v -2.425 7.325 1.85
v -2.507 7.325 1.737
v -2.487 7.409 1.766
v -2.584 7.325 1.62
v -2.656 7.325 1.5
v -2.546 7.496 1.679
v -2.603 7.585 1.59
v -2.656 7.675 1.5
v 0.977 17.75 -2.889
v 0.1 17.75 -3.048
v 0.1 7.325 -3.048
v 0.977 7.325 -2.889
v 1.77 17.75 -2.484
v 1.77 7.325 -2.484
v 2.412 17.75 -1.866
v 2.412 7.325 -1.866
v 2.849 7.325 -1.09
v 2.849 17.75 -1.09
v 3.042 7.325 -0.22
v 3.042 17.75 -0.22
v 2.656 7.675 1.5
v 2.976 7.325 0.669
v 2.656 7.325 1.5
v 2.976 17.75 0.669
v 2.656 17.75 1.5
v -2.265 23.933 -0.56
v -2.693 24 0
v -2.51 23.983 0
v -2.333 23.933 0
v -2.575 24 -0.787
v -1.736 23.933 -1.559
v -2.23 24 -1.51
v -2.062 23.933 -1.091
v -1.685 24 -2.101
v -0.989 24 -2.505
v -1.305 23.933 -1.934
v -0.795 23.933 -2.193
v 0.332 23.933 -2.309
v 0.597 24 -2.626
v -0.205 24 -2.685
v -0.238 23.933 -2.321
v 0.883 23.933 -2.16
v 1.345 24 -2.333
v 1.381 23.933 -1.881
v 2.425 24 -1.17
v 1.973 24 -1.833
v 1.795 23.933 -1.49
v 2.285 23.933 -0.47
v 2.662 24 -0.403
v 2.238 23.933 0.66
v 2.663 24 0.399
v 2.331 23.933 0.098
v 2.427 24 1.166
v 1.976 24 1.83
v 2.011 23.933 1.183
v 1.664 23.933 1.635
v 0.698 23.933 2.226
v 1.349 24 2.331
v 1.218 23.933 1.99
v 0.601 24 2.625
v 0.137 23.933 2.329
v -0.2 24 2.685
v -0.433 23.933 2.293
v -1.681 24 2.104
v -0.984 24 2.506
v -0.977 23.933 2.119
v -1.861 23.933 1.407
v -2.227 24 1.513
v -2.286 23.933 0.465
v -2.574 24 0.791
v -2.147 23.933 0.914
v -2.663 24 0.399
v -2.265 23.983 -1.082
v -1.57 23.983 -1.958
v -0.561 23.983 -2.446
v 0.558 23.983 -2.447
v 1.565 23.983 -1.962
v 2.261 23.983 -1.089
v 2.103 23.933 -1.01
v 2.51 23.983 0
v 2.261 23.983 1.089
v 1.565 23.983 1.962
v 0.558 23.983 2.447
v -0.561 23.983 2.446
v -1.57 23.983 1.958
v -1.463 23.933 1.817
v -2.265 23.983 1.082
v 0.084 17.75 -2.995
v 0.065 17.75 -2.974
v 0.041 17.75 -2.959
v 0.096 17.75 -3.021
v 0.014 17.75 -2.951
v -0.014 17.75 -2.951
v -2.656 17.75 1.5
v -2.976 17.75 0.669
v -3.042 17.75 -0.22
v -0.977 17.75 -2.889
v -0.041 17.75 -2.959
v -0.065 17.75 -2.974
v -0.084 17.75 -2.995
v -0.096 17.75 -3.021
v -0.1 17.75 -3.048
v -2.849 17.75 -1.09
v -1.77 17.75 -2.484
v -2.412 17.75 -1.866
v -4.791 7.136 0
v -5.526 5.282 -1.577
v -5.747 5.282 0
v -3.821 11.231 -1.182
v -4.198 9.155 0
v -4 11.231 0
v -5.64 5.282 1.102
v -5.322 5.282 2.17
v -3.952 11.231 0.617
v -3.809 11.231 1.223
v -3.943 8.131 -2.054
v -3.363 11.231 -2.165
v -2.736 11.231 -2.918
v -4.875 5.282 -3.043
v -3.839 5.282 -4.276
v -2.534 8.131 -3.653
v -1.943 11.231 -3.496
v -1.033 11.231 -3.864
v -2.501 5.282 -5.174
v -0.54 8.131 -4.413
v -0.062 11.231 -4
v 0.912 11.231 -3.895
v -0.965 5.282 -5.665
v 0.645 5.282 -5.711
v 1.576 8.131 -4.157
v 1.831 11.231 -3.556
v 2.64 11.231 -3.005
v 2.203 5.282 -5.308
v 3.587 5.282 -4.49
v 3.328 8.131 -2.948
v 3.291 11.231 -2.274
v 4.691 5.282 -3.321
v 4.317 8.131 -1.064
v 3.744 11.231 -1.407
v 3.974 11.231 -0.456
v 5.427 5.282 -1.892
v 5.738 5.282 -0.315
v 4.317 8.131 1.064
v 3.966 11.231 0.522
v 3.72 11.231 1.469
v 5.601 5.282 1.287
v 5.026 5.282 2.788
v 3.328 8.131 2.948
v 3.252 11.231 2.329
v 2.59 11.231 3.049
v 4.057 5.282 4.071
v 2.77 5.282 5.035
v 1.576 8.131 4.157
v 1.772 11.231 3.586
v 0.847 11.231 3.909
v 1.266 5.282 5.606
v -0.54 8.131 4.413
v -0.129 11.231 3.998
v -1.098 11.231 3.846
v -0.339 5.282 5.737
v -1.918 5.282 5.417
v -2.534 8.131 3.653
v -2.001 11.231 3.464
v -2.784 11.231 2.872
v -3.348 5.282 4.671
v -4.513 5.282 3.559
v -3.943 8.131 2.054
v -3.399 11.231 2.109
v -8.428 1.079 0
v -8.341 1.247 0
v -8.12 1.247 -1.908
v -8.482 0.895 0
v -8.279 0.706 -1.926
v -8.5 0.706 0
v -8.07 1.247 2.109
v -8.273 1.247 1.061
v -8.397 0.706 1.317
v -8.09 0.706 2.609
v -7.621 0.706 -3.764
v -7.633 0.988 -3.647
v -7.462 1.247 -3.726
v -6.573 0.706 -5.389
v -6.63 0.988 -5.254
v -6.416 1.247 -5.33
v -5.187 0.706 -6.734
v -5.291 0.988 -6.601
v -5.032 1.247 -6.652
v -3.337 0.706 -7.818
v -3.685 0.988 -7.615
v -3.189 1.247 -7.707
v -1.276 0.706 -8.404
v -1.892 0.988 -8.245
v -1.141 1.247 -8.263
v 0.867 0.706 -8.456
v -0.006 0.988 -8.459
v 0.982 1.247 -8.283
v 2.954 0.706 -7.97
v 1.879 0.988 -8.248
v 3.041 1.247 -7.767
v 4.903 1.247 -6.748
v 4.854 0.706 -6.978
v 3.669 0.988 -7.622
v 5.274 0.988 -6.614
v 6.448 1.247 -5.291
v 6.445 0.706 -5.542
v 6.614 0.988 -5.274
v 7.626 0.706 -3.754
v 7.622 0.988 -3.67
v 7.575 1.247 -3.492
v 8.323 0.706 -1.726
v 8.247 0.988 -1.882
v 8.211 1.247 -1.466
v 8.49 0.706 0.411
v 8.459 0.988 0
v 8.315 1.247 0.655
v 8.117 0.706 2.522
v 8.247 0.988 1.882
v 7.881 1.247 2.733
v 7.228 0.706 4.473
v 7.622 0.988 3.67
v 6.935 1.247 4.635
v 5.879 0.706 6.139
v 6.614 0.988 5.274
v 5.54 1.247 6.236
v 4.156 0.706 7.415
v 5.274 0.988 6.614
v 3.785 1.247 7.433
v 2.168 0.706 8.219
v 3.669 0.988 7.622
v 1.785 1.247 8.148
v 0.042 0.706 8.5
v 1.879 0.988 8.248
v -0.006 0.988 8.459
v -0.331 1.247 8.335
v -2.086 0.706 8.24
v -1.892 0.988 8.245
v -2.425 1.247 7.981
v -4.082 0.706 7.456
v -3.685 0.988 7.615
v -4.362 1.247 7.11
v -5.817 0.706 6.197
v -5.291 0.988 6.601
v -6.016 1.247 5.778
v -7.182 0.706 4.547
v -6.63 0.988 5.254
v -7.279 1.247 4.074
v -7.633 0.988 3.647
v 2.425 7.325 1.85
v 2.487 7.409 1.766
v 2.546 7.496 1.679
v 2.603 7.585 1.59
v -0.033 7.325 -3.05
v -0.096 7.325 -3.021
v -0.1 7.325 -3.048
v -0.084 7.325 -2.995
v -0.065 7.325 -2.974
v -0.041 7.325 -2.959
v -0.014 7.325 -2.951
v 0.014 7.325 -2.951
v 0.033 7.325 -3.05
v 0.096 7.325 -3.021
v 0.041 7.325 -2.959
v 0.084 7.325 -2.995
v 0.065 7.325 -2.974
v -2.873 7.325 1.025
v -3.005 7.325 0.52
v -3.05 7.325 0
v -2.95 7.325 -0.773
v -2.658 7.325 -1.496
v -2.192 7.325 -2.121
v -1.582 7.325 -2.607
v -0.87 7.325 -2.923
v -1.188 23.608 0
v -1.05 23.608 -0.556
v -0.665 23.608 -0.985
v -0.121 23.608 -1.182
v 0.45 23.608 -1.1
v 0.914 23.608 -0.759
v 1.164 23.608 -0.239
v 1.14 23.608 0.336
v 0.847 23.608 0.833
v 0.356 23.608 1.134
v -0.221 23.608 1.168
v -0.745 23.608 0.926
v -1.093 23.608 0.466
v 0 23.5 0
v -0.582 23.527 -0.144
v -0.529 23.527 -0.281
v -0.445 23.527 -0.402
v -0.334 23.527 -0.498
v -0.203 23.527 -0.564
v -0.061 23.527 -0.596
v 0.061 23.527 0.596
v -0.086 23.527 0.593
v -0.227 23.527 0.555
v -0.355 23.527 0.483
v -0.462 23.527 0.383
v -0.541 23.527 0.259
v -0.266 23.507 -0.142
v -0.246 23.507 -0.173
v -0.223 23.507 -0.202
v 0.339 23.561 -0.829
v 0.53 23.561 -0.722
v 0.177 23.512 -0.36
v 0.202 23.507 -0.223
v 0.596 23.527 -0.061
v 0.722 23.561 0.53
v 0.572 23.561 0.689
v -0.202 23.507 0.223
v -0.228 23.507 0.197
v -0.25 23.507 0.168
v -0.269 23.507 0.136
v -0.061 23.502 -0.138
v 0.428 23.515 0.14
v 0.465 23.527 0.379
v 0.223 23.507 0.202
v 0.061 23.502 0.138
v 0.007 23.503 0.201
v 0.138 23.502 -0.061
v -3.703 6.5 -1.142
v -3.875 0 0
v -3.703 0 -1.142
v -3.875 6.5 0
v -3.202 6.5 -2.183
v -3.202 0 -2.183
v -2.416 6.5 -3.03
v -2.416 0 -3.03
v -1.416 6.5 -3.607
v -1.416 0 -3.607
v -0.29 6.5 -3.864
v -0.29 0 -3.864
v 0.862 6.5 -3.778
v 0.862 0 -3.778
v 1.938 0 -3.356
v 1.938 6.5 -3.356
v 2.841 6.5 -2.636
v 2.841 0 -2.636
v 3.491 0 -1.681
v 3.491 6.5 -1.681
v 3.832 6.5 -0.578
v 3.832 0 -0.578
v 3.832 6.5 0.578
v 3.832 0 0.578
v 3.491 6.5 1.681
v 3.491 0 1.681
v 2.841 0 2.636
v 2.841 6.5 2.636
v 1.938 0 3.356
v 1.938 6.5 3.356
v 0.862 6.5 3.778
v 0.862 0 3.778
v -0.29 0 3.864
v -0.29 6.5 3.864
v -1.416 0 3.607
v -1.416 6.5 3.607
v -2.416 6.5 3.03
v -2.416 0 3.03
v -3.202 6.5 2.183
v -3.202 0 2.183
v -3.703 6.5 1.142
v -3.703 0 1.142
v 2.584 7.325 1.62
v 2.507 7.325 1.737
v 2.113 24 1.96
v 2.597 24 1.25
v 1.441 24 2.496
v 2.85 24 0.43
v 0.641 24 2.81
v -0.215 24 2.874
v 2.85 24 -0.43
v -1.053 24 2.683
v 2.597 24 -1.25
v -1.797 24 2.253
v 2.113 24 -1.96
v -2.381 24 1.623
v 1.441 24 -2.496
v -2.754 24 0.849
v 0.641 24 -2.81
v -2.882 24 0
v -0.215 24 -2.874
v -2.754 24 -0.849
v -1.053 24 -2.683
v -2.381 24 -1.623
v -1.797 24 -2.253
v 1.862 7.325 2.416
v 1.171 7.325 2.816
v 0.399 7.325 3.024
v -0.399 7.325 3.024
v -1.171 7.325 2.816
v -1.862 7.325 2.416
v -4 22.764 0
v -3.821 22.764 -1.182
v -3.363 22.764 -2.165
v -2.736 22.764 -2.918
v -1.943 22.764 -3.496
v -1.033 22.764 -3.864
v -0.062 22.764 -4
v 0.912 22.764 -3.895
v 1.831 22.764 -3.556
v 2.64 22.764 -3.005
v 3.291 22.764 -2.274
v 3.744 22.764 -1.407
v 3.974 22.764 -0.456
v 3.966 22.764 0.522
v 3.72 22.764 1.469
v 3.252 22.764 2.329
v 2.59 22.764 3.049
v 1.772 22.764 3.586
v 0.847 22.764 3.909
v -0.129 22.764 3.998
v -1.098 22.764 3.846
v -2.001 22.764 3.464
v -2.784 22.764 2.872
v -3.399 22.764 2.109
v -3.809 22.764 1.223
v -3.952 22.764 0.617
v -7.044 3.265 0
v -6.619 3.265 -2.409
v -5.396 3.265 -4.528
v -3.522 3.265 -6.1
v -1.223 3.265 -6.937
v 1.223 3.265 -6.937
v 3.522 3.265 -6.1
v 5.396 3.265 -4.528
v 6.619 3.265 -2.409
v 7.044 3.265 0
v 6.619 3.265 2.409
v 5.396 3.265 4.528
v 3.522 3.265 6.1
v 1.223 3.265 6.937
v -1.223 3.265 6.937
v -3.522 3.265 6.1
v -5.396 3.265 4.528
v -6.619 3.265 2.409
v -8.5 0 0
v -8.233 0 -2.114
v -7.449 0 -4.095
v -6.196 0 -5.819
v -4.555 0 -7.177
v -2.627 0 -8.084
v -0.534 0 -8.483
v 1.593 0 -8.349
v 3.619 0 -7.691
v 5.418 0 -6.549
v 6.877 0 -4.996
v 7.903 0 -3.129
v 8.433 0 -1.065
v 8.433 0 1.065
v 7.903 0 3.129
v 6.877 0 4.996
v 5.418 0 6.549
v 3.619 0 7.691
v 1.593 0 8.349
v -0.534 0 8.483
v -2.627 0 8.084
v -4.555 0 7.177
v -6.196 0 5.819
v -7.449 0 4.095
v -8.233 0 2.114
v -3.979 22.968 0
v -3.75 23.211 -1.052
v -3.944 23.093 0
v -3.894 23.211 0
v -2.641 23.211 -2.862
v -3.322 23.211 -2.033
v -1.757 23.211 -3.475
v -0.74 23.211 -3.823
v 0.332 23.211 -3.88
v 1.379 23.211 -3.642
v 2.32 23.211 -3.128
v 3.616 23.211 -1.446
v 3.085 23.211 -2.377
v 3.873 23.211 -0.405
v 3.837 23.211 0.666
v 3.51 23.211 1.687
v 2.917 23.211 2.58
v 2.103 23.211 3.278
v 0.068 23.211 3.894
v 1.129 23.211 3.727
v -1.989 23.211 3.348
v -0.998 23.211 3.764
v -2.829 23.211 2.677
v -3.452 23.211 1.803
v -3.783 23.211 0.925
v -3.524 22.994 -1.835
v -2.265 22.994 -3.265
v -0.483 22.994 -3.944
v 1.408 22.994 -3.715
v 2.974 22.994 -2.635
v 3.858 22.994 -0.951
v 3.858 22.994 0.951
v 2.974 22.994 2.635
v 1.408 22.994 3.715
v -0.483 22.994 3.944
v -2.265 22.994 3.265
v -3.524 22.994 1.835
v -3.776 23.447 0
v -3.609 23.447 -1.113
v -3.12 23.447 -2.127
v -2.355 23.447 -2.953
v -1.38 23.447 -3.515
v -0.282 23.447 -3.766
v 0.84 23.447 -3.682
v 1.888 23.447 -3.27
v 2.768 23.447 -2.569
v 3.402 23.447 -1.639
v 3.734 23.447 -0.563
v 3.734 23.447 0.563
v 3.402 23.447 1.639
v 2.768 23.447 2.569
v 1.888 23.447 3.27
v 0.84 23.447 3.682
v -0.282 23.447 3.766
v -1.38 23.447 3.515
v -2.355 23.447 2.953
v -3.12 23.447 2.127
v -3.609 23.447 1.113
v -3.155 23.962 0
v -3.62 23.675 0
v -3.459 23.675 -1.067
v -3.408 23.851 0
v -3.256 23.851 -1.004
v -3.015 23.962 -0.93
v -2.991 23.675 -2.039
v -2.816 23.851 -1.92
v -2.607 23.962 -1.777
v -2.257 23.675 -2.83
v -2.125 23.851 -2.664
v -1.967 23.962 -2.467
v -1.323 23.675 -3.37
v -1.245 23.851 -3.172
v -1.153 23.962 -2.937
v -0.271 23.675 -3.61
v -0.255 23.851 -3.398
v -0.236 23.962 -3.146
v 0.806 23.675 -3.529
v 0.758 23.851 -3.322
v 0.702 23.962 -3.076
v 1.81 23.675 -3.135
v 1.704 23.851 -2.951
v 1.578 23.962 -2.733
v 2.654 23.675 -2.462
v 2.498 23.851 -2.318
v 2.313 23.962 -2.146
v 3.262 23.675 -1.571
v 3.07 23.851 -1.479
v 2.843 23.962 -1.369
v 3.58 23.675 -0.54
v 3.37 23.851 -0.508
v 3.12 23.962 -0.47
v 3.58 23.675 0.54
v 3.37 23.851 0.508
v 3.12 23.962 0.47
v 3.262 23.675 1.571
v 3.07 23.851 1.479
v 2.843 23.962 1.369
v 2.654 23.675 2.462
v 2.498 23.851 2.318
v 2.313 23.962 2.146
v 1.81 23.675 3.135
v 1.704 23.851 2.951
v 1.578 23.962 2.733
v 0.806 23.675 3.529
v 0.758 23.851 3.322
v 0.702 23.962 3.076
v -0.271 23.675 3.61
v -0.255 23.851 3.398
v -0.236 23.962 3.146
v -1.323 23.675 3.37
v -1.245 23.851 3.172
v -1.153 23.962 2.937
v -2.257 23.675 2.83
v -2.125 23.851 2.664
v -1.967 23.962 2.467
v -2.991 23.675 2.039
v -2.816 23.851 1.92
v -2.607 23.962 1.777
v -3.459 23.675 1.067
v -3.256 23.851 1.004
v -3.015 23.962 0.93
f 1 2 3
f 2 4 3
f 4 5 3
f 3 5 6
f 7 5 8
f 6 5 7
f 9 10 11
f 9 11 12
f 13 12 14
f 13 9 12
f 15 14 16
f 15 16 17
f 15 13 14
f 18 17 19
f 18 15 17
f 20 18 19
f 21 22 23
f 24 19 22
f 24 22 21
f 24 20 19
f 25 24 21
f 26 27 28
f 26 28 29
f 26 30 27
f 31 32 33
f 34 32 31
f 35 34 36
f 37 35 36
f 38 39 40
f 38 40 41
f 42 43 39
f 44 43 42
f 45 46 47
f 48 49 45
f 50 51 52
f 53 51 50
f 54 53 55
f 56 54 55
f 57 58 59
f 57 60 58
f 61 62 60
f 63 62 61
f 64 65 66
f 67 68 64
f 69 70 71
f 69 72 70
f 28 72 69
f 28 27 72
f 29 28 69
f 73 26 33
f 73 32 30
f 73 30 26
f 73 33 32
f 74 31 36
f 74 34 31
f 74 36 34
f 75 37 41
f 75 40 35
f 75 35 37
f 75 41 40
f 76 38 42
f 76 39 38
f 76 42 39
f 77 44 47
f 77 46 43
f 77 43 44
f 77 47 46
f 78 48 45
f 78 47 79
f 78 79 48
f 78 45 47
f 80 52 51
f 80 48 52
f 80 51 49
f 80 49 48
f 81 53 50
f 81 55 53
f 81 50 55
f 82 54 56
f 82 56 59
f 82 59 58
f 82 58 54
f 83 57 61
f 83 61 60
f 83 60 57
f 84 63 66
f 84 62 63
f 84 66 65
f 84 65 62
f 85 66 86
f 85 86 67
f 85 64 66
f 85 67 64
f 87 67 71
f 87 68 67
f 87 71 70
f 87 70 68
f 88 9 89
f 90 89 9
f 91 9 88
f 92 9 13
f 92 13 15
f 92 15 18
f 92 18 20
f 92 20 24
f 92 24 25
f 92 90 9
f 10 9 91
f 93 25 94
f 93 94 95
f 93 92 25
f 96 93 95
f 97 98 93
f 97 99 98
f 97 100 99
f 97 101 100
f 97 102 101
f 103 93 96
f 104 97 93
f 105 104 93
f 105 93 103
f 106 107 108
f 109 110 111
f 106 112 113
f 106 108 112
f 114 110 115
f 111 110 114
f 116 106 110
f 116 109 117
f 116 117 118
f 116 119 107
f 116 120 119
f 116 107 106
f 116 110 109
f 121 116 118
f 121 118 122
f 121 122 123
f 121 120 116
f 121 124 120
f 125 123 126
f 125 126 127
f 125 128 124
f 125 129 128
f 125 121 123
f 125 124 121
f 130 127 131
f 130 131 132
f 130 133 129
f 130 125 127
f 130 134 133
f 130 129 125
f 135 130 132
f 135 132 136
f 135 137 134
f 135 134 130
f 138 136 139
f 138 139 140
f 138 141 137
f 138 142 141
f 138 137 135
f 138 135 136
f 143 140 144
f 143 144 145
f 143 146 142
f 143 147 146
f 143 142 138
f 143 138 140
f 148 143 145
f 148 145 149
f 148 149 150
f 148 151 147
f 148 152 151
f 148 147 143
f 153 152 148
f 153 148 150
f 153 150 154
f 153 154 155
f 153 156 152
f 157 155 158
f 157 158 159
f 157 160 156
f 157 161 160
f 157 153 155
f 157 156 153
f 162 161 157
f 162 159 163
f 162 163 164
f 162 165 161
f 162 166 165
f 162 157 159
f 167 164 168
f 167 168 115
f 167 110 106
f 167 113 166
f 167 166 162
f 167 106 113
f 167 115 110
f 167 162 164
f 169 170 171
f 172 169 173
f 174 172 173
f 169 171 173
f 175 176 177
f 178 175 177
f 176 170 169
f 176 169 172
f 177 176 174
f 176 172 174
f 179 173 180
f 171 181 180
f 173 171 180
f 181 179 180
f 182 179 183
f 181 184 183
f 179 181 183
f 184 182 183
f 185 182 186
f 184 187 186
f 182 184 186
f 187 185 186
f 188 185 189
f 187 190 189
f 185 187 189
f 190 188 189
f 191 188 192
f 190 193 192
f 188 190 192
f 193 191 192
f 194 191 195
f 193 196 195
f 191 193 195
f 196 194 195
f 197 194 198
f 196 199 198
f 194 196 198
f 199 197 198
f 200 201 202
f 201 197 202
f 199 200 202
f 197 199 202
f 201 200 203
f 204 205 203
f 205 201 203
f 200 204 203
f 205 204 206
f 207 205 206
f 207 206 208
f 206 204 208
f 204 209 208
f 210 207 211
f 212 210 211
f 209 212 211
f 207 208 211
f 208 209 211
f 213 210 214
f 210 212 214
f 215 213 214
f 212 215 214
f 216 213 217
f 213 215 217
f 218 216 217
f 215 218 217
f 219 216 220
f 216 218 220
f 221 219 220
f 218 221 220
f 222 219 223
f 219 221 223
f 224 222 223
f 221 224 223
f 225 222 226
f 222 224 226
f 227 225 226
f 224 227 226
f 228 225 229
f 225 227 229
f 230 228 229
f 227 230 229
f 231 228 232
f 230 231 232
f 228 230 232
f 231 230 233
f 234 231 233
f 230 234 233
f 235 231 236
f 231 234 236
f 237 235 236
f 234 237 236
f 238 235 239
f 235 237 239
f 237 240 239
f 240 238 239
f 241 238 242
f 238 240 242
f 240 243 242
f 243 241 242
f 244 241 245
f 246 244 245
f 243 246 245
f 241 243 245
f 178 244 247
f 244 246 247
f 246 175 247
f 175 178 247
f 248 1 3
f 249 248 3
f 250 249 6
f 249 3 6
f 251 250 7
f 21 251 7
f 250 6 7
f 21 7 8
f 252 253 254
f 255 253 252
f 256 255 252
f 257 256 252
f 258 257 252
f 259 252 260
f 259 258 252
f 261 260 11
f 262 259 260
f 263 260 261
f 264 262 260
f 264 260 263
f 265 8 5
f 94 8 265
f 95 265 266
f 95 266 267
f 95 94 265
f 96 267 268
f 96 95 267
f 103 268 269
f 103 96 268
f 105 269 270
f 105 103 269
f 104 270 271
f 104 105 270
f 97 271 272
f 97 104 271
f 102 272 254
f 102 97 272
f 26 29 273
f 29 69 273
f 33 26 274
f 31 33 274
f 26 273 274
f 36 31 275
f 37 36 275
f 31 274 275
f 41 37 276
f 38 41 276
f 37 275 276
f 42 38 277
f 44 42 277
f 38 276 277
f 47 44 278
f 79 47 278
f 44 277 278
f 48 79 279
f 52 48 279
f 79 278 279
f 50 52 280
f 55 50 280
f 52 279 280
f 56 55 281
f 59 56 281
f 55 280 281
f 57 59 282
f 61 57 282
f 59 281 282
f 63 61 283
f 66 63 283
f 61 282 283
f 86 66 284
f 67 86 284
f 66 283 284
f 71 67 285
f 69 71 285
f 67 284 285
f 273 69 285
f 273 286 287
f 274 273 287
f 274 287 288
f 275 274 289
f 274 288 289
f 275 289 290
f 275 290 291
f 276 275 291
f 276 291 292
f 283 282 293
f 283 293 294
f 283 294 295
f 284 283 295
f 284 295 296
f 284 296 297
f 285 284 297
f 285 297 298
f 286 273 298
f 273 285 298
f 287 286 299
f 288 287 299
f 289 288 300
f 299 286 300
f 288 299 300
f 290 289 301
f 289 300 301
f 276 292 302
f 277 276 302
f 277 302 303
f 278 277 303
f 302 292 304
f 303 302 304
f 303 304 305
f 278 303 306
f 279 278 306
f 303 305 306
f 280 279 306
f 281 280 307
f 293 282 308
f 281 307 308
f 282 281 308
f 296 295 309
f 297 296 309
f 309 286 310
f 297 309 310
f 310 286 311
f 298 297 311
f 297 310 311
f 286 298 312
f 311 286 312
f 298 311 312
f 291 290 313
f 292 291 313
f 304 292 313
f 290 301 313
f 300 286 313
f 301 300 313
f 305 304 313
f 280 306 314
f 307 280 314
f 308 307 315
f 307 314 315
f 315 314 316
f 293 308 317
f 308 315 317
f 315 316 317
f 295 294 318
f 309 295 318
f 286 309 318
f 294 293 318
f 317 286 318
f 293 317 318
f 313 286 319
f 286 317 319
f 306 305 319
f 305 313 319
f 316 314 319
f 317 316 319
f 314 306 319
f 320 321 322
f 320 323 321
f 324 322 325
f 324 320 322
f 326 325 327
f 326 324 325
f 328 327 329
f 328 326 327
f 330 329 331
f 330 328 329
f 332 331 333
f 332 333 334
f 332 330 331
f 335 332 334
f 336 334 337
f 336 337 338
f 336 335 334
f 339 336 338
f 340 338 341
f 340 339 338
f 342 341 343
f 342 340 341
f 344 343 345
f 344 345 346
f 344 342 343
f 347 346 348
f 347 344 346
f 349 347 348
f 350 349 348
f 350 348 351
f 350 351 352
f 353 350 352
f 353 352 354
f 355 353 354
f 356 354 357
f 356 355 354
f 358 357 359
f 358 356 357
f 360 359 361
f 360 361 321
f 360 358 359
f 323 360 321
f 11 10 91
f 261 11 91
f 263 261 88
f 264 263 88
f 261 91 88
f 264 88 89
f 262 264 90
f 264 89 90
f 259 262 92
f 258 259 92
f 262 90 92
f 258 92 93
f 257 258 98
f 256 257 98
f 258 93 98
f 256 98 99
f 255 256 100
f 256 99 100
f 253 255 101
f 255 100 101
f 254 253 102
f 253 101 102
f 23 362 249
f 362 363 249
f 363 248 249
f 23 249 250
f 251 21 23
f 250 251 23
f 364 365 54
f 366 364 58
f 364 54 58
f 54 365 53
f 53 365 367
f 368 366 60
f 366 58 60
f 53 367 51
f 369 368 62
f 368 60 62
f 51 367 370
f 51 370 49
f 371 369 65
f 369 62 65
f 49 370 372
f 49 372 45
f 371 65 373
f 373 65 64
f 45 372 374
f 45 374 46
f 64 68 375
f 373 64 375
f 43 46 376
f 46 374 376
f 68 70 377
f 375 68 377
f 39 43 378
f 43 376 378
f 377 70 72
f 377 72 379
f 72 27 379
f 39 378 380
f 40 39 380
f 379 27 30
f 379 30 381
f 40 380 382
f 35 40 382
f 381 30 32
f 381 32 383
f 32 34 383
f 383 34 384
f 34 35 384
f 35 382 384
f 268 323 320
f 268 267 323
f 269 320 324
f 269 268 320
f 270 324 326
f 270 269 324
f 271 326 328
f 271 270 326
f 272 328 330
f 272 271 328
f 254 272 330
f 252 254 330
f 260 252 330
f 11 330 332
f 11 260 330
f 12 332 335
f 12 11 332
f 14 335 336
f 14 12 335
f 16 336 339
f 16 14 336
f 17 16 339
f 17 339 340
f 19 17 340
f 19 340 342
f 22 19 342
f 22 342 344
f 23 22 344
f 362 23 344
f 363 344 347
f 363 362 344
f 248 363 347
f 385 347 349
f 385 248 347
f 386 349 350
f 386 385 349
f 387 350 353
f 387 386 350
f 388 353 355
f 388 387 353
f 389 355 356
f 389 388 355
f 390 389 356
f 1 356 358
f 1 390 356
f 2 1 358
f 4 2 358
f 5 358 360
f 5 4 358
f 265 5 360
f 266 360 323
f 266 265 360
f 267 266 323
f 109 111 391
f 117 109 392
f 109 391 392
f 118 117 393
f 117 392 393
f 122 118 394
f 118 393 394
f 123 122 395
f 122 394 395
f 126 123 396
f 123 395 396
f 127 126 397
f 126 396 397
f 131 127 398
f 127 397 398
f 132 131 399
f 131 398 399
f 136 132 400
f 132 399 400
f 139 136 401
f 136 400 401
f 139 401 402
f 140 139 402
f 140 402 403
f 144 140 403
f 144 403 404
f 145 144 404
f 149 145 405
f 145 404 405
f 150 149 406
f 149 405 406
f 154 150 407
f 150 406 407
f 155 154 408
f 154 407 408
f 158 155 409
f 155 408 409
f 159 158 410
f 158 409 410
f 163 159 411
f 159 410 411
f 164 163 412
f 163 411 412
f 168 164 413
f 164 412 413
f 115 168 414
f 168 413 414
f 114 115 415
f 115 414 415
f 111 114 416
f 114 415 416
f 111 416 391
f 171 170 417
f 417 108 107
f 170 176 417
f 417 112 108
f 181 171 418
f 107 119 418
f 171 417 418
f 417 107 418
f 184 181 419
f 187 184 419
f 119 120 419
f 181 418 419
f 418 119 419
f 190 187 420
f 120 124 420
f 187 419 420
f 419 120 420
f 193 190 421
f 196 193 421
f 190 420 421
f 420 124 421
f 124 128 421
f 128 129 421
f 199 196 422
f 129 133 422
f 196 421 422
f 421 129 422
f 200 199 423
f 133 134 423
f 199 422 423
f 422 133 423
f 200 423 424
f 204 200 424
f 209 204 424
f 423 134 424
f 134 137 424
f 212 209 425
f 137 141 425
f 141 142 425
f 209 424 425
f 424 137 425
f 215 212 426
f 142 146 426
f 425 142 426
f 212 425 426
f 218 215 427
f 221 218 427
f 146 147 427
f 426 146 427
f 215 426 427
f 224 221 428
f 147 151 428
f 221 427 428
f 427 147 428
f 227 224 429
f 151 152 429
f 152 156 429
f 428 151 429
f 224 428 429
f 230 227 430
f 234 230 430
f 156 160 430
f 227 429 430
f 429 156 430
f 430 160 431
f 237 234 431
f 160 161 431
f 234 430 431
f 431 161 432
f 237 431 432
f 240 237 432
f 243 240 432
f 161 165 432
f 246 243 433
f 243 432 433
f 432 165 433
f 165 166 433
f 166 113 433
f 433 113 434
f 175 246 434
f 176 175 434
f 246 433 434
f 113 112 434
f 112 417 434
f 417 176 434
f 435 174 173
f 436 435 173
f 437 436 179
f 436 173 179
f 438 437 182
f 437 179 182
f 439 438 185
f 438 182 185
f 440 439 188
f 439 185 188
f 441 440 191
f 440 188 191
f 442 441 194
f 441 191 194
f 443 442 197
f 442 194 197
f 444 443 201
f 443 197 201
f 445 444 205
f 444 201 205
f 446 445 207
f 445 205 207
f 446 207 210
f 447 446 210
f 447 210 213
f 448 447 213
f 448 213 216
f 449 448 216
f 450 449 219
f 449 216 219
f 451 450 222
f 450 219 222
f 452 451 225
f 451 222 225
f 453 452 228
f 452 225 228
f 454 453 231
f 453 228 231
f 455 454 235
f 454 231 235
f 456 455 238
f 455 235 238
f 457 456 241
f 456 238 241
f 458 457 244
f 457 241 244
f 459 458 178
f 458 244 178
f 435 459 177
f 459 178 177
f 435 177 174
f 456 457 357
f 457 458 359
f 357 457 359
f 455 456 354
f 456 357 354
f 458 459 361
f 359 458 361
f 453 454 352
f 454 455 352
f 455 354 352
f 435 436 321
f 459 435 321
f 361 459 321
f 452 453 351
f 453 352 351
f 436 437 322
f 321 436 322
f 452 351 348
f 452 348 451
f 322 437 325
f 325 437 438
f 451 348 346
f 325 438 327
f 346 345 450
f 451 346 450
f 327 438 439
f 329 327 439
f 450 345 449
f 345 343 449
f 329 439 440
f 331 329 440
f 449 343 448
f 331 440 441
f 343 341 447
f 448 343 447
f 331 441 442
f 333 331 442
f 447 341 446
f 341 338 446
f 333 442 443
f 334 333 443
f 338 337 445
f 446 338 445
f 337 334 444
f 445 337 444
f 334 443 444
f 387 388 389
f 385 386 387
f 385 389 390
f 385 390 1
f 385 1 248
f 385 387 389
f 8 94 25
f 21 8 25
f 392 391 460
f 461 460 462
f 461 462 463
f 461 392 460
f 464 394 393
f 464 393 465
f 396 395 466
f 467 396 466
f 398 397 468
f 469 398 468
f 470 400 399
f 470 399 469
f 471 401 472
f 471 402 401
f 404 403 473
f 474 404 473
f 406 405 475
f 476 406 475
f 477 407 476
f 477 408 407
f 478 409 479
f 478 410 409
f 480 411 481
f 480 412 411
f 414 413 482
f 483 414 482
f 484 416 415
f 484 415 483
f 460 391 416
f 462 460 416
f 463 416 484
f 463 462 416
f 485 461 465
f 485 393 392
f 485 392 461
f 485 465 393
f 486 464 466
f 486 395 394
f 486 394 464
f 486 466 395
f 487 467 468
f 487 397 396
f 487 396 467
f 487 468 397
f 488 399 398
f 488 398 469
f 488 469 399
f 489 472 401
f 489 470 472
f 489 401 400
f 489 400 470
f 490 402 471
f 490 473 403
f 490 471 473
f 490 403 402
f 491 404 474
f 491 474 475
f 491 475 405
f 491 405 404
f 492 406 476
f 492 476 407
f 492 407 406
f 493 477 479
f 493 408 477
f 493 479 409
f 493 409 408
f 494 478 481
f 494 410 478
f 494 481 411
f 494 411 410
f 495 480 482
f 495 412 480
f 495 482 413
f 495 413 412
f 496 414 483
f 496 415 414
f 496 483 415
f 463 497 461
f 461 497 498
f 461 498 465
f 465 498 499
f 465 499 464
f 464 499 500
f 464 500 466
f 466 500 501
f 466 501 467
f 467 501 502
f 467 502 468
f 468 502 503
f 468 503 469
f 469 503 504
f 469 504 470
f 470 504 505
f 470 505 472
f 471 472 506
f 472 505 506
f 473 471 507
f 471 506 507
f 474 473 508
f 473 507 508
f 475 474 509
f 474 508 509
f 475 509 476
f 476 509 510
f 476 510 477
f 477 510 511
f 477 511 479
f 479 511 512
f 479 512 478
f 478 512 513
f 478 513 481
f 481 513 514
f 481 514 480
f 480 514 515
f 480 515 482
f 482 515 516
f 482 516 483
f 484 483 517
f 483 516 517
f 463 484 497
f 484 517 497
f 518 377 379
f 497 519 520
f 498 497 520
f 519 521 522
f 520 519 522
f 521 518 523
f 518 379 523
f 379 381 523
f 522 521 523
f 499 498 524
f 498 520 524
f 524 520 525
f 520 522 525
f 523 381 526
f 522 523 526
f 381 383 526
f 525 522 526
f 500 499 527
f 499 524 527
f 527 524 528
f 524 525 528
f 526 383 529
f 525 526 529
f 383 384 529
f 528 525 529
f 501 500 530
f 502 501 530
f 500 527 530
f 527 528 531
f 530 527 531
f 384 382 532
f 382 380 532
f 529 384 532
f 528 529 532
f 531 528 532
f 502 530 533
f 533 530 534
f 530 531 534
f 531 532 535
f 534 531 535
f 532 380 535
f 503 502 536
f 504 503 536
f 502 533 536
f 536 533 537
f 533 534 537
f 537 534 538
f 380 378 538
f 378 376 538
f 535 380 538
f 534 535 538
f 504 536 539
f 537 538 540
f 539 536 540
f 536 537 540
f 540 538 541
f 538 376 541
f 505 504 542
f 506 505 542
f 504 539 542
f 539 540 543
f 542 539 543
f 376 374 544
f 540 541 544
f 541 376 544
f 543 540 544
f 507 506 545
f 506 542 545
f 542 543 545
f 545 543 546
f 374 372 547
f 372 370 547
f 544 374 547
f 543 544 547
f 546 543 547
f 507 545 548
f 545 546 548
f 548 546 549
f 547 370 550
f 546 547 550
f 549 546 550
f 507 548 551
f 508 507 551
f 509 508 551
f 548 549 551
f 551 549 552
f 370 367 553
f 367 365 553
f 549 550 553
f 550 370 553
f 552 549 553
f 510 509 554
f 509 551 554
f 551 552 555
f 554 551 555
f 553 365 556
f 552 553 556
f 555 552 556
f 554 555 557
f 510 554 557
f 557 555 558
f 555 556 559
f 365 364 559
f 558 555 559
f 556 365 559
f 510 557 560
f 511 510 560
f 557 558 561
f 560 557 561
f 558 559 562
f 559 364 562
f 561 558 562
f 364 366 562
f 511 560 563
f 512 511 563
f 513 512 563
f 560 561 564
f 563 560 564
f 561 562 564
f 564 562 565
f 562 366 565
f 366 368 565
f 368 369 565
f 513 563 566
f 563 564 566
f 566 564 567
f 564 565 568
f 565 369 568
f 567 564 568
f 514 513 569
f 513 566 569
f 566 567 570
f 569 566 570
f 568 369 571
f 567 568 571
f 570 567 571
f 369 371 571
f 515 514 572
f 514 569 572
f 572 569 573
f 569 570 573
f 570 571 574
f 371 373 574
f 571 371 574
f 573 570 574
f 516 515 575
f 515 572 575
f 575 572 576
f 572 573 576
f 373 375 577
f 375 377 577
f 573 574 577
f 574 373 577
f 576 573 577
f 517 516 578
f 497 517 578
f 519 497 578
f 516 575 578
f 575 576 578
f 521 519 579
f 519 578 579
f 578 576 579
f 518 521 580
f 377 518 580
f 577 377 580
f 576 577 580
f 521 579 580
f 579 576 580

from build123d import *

# Parameters (mm, degrees)
FILLET1_R           = 11
FILLET2_R           = 1
BOSS_EXTRUDE1_DEPTH = 10.425
CHAMFER1_SIZE       = 0.35


with BuildPart() as part:
    # Sketch1 → Revolve1 (revolve)
    with BuildSketch(Plane.XY, mode=Mode.PRIVATE) as revolve1_sk:
        with BuildLine():
            Line((0, 0), (8.5, 0))
            Line((8.5, 0), (8.5, 1))
            Line((8.5, 1), (4, 8))
            Line((4, 8), (4, 23))
            Line((4, 23), (3.5, 24))
            Line((3.5, 24), (2.5, 24))
            add(Edge.make_bspline(
                [(2.5, 24), (1.3, 23.5), (0, 23.5)],
                knots=[0, 0, 0, 1, 1, 1], degree=2))
            Line((0, 23.5), (0, 0))
        make_face()
    revolve(revolve1_sk.sketch.rotate(Axis((0, 23.5, 0), (0, -1, 0)), 180), axis=Axis((0, 23.5, 0), (0, -1, 0)))

    # Fillet1
    fillet1_edges = [part.edges().sort_by_distance(p)[0] for p in [
        (4, 8, 0),
    ]]
    fillet(fillet1_edges, radius=FILLET1_R)

    # Fillet2
    fillet2_edges = [part.edges().sort_by_distance(p)[0] for p in [
        (2.5, 24, 0),
        (3.5, 24, 0),
        (4, 23, 0),
        (8.5, 1, 0),
    ]]
    fillet(fillet2_edges, radius=FILLET2_R)

    # Sketch3 → Cut-Revolve1 (revolve, cut)
    with BuildSketch(Plane.XY, mode=Mode.PRIVATE) as cut_revolve1_sk:
        Polygon((0, 0), (3.875, 0), (3.875, 6.5), (3.05, 7.325), (3.05, 17.75), (0, 17.75), align=None)
    revolve(cut_revolve1_sk.sketch.rotate(Axis((0, 17.75, 0), (0, -1, 0)), 180), axis=Axis((0, 17.75, 0), (0, -1, 0)), mode=Mode.SUBTRACT)

    # Sketch4 → Boss-Extrude1 (add)
    with BuildSketch(Plane.XZ.offset(-17.75)):
        with BuildLine():
            Line((-2.655654345, 1.5), (2.655654345, 1.5))
            ThreePointArc((2.655654345, 1.5), (0, 3.05), (-2.655654345, 1.5))
        make_face()
        with BuildLine():
            ThreePointArc((-0.099986562, -3.048360656), (0, -3.05), (0.099986562, -3.048360656))
            ThreePointArc((0.099986562, -3.048360656), (0, -2.95), (-0.099986562, -3.048360656))
        make_face()
    extrude(amount=BOSS_EXTRUDE1_DEPTH)

    # Chamfer1
    # the kernel refuses this chamfer: 0.35 mm, written as the material it takes off along each edge
    with BuildSketch(Plane(origin=(-3.555743391, 7.325, 1.5), x_dir=(0, -0.02749587661058614, 0.9996219169112968), z_dir=(1, 0, 0))) as chamfer1_piece_1_section:
        Polygon((CHAMFER1_SIZE * 0.999621916911, -CHAMFER1_SIZE * 0.0274958766106), (-CHAMFER1_SIZE * 0.0274958766106, -CHAMFER1_SIZE * 0.999621916911), (0, 0), align=None)
    chamfer1_piece_1 = extrude(amount=7.111486782, mode=Mode.PRIVATE)
    chamfer1_piece_1 = chamfer1_piece_1 & Plane(origin=(0, 7.499624527, 0), x_dir=(-1, 0, 0), z_dir=(0, 1, 0)) * Cylinder(3.05, 16, mode=Mode.PRIVATE)
    add(chamfer1_piece_1, mode=Mode.SUBTRACT)


solid = part.part
